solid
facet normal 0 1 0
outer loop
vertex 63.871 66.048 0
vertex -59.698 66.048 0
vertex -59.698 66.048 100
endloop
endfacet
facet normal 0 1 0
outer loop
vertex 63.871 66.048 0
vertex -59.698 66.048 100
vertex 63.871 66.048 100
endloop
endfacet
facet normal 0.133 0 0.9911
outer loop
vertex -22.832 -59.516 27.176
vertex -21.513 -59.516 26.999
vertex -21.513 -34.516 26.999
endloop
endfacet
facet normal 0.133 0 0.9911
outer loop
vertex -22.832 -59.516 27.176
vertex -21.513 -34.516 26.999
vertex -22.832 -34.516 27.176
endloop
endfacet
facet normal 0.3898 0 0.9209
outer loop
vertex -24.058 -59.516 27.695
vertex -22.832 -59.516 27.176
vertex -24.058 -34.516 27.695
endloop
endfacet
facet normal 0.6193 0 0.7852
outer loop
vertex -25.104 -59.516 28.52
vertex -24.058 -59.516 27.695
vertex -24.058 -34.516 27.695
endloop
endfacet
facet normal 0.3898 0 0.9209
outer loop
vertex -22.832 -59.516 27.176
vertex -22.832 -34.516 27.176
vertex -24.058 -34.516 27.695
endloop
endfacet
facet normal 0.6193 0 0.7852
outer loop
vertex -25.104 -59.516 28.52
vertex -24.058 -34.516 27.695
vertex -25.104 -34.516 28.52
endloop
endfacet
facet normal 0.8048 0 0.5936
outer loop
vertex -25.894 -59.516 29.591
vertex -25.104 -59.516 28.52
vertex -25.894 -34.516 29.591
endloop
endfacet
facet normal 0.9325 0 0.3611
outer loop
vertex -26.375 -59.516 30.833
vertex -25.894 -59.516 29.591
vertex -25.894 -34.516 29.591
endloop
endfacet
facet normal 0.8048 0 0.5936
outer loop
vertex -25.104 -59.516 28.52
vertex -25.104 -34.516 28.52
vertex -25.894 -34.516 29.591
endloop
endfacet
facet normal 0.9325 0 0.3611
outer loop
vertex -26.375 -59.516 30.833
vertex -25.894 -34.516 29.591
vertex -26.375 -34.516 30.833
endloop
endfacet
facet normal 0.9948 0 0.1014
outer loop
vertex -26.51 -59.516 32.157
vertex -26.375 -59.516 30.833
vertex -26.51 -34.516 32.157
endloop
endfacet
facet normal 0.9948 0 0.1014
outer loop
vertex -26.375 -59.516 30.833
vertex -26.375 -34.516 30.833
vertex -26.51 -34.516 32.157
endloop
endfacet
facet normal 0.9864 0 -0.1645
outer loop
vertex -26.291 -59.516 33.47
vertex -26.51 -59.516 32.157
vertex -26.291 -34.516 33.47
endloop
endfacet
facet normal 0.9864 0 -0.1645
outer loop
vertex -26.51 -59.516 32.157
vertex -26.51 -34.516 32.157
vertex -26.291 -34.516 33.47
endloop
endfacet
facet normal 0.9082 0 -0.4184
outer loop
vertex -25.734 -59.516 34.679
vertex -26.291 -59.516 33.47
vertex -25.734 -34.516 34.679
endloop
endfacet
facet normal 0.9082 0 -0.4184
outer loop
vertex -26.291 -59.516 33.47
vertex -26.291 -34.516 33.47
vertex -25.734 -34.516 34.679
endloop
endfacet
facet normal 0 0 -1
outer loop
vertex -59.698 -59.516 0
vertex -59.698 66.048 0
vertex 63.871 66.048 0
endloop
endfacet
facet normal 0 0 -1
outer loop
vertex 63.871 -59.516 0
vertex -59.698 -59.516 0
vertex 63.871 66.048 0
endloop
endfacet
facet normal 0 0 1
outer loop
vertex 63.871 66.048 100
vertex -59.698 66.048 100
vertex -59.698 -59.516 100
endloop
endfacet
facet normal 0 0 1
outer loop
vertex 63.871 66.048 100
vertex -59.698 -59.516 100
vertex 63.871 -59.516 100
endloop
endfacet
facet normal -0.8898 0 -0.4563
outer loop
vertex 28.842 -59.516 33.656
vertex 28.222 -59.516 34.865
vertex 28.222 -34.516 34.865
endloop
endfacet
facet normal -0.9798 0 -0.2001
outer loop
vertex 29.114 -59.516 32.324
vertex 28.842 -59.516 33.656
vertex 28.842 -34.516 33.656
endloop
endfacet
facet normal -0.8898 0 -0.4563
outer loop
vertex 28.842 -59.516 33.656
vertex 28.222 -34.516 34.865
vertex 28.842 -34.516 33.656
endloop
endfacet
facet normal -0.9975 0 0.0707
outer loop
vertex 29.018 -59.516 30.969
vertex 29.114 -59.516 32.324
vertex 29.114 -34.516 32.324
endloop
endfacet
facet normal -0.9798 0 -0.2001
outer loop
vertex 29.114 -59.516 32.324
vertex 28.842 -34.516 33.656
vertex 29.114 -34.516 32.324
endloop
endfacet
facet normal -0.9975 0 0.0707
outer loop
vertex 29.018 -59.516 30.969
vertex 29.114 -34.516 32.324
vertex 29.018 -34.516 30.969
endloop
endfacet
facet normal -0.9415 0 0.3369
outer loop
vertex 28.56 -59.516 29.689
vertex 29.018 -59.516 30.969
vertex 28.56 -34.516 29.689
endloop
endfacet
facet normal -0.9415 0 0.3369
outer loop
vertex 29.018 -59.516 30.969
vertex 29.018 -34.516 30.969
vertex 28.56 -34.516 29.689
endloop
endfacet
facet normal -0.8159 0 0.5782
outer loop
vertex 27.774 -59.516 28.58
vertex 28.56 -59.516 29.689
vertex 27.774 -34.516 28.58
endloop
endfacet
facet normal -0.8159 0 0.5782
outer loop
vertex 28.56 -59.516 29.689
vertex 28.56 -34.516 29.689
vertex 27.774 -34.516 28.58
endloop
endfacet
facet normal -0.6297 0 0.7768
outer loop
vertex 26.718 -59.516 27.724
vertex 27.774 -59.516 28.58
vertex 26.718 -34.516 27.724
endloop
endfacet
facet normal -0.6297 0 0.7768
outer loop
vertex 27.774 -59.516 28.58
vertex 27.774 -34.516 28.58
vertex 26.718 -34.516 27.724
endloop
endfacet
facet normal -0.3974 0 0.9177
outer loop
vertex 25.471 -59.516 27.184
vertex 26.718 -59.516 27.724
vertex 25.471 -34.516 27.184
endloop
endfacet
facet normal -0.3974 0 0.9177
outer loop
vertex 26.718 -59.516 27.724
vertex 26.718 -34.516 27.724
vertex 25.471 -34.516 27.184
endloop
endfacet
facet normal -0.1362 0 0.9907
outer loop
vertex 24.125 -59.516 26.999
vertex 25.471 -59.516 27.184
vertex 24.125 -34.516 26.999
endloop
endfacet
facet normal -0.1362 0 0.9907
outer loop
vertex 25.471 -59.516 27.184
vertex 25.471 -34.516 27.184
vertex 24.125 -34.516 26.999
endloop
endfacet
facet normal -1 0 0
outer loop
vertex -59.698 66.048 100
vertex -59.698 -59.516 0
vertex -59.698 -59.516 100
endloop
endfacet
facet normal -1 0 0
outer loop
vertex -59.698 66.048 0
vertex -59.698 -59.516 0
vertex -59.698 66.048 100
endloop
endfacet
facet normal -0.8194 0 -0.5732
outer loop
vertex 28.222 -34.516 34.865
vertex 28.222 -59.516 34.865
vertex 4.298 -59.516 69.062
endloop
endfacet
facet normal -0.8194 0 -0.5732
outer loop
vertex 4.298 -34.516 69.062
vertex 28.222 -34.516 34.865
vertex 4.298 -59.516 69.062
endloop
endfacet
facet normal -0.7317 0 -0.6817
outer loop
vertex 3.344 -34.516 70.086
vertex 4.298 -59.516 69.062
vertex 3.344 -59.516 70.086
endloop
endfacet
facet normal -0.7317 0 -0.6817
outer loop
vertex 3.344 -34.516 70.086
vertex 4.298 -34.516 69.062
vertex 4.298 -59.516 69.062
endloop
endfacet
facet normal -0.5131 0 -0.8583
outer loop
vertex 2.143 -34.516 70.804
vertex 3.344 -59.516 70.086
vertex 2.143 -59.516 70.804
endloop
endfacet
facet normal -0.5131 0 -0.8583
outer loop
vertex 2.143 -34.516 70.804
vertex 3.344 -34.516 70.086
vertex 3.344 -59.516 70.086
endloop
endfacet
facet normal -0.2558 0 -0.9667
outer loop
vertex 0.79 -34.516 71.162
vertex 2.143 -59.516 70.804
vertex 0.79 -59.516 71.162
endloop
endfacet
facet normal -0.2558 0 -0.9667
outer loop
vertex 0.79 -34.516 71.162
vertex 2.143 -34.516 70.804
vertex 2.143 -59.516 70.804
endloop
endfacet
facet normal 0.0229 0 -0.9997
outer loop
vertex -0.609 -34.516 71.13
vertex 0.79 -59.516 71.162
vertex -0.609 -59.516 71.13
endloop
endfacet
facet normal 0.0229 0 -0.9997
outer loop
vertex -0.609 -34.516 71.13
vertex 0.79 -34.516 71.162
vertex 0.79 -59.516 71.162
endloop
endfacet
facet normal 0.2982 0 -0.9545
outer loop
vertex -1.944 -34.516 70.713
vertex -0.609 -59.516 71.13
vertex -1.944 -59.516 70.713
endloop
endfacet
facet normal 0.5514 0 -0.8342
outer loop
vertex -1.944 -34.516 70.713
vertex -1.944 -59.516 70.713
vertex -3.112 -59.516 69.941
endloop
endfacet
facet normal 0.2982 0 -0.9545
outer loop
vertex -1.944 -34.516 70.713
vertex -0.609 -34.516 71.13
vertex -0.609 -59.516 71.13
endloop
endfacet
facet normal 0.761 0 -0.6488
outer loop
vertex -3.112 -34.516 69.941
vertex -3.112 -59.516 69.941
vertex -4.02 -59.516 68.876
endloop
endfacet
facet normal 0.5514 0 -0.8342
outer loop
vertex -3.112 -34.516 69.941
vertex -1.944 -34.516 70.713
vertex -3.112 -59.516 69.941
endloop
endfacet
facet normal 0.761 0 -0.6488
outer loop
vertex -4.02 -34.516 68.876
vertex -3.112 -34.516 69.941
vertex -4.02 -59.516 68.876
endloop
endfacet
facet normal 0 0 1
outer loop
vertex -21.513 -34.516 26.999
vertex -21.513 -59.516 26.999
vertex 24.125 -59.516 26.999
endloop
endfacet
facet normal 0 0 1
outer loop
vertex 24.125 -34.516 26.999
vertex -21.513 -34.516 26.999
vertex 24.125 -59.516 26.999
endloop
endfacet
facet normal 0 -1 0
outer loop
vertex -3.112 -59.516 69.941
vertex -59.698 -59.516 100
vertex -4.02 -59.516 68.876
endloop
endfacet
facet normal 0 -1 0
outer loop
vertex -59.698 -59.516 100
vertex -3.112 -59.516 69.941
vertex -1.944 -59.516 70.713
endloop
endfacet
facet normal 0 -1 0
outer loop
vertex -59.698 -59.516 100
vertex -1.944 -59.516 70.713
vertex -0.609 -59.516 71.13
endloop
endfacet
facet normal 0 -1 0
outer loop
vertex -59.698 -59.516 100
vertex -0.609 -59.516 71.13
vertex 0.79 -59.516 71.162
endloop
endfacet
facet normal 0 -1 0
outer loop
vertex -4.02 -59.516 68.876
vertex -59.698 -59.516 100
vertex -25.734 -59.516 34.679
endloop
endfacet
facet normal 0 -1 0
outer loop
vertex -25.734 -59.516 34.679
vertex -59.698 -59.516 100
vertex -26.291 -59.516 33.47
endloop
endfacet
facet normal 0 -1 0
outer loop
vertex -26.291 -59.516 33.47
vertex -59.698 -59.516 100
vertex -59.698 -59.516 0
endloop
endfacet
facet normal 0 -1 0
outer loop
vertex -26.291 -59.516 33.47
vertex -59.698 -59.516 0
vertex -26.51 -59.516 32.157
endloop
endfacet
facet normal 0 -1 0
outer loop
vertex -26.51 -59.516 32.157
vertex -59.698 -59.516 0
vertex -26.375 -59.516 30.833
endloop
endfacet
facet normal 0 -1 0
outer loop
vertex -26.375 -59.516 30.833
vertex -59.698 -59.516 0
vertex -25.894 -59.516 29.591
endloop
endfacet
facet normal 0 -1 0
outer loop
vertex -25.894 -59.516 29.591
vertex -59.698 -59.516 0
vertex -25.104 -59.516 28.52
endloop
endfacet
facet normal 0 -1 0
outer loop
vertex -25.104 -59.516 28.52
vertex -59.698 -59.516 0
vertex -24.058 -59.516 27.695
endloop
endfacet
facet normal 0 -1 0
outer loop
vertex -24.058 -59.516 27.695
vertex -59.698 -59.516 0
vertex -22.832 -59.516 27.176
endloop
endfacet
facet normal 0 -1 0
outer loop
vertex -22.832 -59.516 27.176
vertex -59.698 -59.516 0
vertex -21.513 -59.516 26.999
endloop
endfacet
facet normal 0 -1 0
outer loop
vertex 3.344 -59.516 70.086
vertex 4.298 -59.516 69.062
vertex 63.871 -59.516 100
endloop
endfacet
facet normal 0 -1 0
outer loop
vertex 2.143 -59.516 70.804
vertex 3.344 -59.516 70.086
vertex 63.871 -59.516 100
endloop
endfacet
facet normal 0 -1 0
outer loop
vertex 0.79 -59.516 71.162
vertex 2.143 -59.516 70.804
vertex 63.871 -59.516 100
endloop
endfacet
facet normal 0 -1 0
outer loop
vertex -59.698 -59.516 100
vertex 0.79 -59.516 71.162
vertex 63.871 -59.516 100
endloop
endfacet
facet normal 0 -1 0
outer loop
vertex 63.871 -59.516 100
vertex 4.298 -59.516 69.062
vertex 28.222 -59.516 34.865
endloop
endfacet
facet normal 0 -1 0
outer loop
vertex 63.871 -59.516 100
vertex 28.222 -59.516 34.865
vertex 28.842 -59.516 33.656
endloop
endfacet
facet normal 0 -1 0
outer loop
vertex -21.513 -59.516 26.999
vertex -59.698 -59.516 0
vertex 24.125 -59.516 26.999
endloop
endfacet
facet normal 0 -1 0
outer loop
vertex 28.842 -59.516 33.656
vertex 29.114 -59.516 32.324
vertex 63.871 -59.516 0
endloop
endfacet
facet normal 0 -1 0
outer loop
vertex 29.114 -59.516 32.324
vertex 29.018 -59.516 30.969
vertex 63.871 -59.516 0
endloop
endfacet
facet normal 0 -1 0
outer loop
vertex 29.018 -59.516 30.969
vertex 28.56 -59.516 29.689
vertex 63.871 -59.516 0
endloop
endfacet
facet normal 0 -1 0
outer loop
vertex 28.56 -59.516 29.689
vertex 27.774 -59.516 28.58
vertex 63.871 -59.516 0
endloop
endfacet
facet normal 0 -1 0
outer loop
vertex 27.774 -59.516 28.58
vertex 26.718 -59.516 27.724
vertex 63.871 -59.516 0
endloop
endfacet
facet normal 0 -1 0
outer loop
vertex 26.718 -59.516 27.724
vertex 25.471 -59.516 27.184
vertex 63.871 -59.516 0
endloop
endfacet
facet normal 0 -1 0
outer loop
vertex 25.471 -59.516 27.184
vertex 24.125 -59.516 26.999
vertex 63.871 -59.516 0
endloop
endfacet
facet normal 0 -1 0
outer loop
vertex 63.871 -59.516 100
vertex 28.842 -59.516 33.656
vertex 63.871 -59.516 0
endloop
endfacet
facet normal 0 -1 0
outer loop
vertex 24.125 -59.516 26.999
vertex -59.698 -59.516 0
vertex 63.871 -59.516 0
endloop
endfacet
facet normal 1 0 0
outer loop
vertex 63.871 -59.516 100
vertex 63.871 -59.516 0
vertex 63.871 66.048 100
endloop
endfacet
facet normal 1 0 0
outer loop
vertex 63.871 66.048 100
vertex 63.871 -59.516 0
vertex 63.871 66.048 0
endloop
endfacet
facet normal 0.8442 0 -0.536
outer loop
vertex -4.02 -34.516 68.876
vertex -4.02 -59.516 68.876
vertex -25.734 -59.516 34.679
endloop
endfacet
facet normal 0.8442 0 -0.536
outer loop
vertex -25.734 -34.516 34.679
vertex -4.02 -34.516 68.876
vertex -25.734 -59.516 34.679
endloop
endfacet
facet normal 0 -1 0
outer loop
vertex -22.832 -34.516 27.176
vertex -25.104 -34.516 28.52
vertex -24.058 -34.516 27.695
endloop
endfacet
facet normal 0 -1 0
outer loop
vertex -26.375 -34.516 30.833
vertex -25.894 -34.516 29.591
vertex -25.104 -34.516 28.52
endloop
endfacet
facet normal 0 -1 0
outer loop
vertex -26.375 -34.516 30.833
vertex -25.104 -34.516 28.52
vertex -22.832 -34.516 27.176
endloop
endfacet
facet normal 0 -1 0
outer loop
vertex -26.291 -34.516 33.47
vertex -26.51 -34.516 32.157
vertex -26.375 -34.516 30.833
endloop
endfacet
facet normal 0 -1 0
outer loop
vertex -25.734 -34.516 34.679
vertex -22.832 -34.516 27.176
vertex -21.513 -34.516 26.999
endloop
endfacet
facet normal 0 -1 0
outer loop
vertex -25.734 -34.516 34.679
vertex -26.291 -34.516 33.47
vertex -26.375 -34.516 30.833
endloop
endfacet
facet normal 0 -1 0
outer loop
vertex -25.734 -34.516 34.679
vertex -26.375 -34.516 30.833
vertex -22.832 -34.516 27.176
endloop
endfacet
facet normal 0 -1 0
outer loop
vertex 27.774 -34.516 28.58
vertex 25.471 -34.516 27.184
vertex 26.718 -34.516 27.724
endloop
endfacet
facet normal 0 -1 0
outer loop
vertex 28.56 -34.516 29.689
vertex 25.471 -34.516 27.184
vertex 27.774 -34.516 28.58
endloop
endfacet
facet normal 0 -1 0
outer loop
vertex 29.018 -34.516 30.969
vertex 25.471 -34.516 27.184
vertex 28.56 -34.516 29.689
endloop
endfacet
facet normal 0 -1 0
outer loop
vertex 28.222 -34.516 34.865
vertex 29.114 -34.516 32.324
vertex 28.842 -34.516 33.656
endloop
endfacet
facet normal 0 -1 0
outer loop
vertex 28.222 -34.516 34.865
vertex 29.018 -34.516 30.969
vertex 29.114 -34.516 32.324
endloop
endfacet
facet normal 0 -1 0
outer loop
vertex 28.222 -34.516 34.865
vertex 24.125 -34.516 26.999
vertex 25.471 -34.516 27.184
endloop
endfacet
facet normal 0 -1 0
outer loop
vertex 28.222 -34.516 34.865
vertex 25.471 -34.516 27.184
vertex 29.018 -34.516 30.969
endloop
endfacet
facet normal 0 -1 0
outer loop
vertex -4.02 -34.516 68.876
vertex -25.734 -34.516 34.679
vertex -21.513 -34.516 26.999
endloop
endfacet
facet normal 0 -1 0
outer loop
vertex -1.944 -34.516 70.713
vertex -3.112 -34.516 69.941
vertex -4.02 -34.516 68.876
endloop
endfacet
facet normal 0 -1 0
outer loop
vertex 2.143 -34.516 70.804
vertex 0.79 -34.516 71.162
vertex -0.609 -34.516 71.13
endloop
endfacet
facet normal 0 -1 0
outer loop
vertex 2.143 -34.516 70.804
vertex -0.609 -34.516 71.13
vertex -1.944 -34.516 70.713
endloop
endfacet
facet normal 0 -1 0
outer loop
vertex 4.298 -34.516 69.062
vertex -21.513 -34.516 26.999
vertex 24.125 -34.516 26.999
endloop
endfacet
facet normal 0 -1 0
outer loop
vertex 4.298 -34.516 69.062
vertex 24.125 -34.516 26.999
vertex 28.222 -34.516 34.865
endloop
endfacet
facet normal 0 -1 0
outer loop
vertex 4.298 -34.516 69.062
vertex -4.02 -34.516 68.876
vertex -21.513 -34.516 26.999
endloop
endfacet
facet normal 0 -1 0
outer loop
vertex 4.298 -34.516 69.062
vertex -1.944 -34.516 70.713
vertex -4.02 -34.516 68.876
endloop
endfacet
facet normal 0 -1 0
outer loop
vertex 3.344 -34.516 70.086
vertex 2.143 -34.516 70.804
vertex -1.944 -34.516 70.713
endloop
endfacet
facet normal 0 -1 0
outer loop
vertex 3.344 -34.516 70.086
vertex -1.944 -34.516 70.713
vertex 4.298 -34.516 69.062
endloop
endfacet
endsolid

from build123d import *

# Parameters (mm, degrees)
F0_W     = 123.5685497522
F0_H     = 125.5645230412
F1_DEPTH = 100
F3_DEPTH = 25
F4_R     = 5


with BuildPart() as f1:
    # F0 (on Top) → F1 (new body)
    with BuildSketch(Plane.XY):
        with Locations((2.0866915584, 3.2661296427)):
            Rectangle(F0_W, F0_H)
    extrude(amount=F1_DEPTH)

    # F2 (on face) → F3 (cut)
    with BuildSketch(Plane.XZ.offset(59.5161318779)):
        Polygon((0, 75.206823647), (-30.6101683527, 26.9990302622), (33.7249785662, 26.9990302622), align=None)
    extrude(amount=-F3_DEPTH, mode=Mode.SUBTRACT)

    # F4
    f4_edges = [f1.edges().sort_by_distance(p)[0] for p in [
        (0, -47.016132, 75.206824),
        (-30.610168, -47.016132, 26.99903),
        (33.724979, -47.016132, 26.99903),
    ]]
    fillet(f4_edges, radius=F4_R)


solid = f1.part
